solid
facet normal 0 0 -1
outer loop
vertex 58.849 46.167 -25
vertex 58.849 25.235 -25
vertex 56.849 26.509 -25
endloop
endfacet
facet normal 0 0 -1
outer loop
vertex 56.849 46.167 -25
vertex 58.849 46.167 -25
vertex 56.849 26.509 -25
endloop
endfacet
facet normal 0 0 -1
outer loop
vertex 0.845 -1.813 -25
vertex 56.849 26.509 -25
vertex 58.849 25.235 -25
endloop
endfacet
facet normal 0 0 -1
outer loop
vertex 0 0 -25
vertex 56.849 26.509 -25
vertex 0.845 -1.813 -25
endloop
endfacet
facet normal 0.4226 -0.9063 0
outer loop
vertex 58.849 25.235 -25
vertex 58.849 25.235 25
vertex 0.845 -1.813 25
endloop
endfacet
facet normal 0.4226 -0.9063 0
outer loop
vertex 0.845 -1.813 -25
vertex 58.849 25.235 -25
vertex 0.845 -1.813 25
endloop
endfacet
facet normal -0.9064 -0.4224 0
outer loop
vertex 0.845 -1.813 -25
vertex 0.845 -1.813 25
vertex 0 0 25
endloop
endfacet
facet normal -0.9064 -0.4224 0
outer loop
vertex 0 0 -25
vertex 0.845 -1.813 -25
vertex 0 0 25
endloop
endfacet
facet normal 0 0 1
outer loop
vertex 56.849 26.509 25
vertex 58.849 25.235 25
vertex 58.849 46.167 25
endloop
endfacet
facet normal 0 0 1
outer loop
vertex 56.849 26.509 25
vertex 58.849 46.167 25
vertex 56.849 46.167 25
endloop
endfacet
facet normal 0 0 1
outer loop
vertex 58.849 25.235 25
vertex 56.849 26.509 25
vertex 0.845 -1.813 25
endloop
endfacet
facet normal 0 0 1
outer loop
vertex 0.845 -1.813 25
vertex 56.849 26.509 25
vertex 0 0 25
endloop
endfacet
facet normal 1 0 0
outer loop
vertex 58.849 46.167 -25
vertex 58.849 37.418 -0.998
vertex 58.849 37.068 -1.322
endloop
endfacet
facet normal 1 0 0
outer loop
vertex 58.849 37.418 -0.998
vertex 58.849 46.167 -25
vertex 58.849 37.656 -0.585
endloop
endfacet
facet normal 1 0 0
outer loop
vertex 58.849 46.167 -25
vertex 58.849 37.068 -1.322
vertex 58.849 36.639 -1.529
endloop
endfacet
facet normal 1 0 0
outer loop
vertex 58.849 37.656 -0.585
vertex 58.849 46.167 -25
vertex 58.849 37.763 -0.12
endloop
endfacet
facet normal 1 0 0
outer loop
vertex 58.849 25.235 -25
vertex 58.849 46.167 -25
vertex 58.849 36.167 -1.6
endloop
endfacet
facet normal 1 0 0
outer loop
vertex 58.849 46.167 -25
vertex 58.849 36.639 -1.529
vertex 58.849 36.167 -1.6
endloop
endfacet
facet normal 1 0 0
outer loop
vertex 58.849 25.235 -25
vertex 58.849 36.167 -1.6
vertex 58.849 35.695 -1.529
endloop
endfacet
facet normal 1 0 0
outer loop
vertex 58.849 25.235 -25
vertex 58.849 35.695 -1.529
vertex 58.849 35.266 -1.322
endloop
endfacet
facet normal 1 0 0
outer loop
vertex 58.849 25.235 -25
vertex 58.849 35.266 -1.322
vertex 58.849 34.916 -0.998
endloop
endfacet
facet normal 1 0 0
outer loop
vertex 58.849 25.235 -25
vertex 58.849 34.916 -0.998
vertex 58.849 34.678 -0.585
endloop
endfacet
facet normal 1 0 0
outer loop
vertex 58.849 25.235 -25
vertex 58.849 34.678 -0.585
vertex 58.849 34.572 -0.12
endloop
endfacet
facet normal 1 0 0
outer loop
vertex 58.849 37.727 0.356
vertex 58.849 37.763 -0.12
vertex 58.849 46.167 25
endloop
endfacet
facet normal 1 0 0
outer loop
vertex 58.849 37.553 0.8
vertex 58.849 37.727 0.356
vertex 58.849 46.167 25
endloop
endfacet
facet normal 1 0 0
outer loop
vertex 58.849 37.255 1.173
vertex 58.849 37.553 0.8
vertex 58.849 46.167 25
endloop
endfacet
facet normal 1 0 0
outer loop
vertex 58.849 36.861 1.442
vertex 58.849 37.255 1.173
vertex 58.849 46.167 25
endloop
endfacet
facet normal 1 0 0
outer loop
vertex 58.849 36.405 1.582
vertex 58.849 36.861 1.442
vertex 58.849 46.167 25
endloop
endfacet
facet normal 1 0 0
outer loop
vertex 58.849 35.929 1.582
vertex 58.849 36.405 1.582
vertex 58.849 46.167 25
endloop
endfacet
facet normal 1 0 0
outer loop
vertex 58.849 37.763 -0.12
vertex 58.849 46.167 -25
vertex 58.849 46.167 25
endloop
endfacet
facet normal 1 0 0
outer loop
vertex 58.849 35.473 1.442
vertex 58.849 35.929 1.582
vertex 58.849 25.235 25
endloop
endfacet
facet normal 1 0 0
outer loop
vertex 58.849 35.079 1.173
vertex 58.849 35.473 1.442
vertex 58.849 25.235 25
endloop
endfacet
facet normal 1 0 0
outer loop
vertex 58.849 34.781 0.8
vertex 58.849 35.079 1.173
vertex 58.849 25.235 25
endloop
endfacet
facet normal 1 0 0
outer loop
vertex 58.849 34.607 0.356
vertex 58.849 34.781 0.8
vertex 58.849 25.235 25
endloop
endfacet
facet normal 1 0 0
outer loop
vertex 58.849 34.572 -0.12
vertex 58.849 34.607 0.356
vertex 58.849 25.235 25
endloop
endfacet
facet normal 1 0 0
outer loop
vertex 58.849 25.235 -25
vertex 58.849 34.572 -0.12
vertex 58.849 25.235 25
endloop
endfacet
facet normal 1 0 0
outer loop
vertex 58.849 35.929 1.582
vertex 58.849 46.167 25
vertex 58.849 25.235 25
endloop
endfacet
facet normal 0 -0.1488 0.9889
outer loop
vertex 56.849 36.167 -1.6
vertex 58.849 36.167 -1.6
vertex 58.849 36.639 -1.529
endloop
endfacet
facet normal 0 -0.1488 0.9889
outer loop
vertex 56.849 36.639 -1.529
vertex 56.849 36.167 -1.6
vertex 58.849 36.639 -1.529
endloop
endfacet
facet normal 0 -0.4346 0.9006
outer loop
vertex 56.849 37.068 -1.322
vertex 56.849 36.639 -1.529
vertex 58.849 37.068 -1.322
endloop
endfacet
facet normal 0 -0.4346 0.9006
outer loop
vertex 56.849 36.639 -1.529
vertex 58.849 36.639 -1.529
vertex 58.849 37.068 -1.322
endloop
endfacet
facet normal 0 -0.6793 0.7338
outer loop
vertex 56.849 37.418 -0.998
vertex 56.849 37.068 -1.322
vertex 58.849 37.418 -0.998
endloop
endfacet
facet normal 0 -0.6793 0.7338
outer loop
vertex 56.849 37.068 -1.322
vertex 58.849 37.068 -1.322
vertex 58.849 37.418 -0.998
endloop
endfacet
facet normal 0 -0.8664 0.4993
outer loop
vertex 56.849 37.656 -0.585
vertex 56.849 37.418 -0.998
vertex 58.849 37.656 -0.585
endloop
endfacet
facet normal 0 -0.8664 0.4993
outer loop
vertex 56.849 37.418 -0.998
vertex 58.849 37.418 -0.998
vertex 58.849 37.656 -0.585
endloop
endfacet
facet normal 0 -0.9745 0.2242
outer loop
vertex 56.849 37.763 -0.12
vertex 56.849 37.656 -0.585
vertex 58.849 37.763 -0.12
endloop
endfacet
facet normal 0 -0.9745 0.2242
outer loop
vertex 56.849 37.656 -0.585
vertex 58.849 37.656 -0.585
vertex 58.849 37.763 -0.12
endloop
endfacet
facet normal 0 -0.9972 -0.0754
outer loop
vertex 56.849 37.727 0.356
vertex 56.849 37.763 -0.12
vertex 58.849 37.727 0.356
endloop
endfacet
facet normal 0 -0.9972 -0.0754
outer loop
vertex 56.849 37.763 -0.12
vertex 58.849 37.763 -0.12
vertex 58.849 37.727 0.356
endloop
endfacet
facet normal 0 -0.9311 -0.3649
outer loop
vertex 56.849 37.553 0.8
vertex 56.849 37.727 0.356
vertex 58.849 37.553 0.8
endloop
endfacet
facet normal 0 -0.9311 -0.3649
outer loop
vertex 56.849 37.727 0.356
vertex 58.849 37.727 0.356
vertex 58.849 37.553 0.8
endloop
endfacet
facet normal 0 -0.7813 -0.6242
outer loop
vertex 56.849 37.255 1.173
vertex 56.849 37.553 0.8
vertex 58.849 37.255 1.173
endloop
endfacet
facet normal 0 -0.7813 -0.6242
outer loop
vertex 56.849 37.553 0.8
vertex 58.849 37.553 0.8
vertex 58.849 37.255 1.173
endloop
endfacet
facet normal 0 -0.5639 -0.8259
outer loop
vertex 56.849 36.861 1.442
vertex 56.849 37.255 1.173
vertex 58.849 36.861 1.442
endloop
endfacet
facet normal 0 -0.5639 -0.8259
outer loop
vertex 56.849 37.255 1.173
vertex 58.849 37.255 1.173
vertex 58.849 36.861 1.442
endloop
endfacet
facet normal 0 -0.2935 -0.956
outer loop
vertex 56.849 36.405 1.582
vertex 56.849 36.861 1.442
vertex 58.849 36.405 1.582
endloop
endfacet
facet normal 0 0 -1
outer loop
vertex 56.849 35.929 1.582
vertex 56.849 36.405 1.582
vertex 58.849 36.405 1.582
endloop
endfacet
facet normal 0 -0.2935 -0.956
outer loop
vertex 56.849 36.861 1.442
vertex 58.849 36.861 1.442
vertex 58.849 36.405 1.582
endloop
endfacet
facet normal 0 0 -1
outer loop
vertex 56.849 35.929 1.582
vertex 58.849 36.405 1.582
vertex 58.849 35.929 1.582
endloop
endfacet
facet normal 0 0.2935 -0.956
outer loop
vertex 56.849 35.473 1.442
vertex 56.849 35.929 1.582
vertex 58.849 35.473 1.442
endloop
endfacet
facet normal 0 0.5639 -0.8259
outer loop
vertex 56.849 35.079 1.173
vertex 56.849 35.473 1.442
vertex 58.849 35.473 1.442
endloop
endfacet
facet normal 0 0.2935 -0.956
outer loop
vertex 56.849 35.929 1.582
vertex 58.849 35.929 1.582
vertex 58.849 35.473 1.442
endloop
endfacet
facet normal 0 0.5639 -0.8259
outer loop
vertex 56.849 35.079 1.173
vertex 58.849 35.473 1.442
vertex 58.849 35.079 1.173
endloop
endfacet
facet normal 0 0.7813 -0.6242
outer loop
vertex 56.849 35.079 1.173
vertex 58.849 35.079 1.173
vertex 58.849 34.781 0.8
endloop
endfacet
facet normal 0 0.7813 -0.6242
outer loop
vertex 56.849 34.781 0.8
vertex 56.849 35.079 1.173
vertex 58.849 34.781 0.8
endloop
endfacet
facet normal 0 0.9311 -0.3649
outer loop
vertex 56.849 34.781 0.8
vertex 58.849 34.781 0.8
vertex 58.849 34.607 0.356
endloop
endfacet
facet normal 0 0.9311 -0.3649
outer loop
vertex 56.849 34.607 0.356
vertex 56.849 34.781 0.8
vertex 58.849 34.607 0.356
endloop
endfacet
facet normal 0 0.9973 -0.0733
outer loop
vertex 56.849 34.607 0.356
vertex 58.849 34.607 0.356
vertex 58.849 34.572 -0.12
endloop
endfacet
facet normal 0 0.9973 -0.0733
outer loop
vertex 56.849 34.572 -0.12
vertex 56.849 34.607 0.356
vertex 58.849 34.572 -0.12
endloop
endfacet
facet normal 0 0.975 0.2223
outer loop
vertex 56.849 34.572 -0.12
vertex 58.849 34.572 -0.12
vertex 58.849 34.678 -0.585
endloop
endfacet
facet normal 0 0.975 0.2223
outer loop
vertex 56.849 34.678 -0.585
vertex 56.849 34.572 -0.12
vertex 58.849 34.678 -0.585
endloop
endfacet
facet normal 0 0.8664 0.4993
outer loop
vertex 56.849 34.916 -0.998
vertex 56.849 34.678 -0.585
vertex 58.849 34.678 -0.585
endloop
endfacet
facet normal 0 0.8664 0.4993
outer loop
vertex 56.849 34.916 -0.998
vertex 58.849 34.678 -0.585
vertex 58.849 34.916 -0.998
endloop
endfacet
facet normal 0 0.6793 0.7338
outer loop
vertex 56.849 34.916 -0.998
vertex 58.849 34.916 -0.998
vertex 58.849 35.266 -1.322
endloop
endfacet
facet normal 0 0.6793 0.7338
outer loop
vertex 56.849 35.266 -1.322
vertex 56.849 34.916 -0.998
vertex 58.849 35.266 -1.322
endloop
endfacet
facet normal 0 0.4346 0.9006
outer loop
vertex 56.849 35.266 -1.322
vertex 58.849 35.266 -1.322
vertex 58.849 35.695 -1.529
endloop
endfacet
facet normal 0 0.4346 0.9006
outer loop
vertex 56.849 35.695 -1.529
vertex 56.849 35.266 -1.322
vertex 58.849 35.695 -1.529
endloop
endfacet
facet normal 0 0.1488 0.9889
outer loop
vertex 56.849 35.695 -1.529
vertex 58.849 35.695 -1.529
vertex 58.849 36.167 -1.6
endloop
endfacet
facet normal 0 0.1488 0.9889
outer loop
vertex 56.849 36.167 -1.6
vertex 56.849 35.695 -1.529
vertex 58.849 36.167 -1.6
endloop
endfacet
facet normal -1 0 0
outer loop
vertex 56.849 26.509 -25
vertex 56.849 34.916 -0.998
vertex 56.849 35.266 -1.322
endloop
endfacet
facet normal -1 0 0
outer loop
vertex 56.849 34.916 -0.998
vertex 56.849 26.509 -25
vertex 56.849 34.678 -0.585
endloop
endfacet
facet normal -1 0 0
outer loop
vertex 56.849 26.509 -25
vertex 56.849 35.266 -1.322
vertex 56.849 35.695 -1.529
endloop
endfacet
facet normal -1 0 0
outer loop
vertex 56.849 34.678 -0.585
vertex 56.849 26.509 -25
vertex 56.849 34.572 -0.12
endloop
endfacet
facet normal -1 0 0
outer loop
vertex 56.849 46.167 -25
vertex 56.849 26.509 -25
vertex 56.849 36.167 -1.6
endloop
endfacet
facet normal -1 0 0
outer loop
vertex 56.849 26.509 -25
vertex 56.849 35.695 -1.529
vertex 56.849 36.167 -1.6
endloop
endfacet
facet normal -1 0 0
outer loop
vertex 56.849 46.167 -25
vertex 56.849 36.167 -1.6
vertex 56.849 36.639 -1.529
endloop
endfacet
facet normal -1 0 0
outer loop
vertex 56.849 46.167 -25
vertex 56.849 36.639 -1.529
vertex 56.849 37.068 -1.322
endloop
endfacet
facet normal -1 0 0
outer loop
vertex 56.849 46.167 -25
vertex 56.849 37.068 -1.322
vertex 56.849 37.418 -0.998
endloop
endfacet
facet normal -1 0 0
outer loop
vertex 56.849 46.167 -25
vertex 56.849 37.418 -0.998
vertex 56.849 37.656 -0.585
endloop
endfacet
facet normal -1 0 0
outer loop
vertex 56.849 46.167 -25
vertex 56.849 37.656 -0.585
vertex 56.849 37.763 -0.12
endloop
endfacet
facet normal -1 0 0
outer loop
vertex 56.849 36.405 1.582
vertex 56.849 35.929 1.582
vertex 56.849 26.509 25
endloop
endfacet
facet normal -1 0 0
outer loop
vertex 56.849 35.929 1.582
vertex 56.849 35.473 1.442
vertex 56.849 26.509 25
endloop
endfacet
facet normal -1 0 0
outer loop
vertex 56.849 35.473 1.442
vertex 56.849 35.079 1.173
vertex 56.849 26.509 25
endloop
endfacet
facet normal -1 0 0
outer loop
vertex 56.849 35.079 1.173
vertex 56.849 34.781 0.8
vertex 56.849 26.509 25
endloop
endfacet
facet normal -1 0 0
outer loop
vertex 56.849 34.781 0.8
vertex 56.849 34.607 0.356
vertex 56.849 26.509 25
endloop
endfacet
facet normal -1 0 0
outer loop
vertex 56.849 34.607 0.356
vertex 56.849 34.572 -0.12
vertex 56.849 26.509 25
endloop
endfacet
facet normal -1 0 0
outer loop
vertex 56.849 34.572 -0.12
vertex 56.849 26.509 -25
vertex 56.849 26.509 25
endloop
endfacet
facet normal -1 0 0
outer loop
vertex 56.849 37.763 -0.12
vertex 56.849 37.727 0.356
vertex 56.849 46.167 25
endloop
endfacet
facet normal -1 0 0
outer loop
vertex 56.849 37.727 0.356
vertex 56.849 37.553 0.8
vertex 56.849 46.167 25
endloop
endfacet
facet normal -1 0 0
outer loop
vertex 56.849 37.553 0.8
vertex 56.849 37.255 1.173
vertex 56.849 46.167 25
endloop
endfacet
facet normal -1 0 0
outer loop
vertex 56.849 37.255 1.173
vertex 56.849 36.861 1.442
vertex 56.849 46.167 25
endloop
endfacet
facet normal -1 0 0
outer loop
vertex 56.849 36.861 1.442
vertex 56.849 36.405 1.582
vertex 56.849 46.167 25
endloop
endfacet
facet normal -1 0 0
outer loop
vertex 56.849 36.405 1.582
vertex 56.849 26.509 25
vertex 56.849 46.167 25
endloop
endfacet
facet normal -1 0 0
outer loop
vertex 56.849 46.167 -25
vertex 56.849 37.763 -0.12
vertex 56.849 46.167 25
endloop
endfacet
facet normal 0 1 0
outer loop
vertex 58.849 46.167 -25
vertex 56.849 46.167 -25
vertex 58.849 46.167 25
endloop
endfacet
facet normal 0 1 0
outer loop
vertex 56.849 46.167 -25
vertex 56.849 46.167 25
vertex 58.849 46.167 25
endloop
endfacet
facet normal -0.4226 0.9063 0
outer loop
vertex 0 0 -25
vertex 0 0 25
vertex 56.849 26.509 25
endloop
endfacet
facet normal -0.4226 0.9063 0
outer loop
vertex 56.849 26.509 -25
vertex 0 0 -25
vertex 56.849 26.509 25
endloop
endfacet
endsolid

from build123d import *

# Parameters (mm, degrees)
EXTRUDE_1_DEPTH     = 25
SKETCH_2_R          = 1.6
CUT_EXTRUDE_1_DEPTH = 50


with BuildPart() as part:
    # ｽｹｯﾁ1 → ﾎﾞｽ - 押し出し1 (new body, symmetric)
    with BuildSketch(Plane.XY):
        Polygon((0, 0), (56.848934894, 26.509093699), (56.848934894, 46.167032185), (58.848934894, 46.167032185), (58.848934894, 25.234953177), (0.845236523, -1.812615574), align=None)
    extrude(amount=EXTRUDE_1_DEPTH, both=True)

    # ｽｹｯﾁ2 → ｶｯﾄ - 押し出し1 (cut)
    with BuildSketch(Plane(origin=(58.848934894, 0, 0), x_dir=(0, 0, -1), z_dir=(1, 0, 0))):
        with Locations((0, 36.167032185)):
            Circle(SKETCH_2_R)
    extrude(amount=-CUT_EXTRUDE_1_DEPTH, mode=Mode.SUBTRACT)


solid = part.part
